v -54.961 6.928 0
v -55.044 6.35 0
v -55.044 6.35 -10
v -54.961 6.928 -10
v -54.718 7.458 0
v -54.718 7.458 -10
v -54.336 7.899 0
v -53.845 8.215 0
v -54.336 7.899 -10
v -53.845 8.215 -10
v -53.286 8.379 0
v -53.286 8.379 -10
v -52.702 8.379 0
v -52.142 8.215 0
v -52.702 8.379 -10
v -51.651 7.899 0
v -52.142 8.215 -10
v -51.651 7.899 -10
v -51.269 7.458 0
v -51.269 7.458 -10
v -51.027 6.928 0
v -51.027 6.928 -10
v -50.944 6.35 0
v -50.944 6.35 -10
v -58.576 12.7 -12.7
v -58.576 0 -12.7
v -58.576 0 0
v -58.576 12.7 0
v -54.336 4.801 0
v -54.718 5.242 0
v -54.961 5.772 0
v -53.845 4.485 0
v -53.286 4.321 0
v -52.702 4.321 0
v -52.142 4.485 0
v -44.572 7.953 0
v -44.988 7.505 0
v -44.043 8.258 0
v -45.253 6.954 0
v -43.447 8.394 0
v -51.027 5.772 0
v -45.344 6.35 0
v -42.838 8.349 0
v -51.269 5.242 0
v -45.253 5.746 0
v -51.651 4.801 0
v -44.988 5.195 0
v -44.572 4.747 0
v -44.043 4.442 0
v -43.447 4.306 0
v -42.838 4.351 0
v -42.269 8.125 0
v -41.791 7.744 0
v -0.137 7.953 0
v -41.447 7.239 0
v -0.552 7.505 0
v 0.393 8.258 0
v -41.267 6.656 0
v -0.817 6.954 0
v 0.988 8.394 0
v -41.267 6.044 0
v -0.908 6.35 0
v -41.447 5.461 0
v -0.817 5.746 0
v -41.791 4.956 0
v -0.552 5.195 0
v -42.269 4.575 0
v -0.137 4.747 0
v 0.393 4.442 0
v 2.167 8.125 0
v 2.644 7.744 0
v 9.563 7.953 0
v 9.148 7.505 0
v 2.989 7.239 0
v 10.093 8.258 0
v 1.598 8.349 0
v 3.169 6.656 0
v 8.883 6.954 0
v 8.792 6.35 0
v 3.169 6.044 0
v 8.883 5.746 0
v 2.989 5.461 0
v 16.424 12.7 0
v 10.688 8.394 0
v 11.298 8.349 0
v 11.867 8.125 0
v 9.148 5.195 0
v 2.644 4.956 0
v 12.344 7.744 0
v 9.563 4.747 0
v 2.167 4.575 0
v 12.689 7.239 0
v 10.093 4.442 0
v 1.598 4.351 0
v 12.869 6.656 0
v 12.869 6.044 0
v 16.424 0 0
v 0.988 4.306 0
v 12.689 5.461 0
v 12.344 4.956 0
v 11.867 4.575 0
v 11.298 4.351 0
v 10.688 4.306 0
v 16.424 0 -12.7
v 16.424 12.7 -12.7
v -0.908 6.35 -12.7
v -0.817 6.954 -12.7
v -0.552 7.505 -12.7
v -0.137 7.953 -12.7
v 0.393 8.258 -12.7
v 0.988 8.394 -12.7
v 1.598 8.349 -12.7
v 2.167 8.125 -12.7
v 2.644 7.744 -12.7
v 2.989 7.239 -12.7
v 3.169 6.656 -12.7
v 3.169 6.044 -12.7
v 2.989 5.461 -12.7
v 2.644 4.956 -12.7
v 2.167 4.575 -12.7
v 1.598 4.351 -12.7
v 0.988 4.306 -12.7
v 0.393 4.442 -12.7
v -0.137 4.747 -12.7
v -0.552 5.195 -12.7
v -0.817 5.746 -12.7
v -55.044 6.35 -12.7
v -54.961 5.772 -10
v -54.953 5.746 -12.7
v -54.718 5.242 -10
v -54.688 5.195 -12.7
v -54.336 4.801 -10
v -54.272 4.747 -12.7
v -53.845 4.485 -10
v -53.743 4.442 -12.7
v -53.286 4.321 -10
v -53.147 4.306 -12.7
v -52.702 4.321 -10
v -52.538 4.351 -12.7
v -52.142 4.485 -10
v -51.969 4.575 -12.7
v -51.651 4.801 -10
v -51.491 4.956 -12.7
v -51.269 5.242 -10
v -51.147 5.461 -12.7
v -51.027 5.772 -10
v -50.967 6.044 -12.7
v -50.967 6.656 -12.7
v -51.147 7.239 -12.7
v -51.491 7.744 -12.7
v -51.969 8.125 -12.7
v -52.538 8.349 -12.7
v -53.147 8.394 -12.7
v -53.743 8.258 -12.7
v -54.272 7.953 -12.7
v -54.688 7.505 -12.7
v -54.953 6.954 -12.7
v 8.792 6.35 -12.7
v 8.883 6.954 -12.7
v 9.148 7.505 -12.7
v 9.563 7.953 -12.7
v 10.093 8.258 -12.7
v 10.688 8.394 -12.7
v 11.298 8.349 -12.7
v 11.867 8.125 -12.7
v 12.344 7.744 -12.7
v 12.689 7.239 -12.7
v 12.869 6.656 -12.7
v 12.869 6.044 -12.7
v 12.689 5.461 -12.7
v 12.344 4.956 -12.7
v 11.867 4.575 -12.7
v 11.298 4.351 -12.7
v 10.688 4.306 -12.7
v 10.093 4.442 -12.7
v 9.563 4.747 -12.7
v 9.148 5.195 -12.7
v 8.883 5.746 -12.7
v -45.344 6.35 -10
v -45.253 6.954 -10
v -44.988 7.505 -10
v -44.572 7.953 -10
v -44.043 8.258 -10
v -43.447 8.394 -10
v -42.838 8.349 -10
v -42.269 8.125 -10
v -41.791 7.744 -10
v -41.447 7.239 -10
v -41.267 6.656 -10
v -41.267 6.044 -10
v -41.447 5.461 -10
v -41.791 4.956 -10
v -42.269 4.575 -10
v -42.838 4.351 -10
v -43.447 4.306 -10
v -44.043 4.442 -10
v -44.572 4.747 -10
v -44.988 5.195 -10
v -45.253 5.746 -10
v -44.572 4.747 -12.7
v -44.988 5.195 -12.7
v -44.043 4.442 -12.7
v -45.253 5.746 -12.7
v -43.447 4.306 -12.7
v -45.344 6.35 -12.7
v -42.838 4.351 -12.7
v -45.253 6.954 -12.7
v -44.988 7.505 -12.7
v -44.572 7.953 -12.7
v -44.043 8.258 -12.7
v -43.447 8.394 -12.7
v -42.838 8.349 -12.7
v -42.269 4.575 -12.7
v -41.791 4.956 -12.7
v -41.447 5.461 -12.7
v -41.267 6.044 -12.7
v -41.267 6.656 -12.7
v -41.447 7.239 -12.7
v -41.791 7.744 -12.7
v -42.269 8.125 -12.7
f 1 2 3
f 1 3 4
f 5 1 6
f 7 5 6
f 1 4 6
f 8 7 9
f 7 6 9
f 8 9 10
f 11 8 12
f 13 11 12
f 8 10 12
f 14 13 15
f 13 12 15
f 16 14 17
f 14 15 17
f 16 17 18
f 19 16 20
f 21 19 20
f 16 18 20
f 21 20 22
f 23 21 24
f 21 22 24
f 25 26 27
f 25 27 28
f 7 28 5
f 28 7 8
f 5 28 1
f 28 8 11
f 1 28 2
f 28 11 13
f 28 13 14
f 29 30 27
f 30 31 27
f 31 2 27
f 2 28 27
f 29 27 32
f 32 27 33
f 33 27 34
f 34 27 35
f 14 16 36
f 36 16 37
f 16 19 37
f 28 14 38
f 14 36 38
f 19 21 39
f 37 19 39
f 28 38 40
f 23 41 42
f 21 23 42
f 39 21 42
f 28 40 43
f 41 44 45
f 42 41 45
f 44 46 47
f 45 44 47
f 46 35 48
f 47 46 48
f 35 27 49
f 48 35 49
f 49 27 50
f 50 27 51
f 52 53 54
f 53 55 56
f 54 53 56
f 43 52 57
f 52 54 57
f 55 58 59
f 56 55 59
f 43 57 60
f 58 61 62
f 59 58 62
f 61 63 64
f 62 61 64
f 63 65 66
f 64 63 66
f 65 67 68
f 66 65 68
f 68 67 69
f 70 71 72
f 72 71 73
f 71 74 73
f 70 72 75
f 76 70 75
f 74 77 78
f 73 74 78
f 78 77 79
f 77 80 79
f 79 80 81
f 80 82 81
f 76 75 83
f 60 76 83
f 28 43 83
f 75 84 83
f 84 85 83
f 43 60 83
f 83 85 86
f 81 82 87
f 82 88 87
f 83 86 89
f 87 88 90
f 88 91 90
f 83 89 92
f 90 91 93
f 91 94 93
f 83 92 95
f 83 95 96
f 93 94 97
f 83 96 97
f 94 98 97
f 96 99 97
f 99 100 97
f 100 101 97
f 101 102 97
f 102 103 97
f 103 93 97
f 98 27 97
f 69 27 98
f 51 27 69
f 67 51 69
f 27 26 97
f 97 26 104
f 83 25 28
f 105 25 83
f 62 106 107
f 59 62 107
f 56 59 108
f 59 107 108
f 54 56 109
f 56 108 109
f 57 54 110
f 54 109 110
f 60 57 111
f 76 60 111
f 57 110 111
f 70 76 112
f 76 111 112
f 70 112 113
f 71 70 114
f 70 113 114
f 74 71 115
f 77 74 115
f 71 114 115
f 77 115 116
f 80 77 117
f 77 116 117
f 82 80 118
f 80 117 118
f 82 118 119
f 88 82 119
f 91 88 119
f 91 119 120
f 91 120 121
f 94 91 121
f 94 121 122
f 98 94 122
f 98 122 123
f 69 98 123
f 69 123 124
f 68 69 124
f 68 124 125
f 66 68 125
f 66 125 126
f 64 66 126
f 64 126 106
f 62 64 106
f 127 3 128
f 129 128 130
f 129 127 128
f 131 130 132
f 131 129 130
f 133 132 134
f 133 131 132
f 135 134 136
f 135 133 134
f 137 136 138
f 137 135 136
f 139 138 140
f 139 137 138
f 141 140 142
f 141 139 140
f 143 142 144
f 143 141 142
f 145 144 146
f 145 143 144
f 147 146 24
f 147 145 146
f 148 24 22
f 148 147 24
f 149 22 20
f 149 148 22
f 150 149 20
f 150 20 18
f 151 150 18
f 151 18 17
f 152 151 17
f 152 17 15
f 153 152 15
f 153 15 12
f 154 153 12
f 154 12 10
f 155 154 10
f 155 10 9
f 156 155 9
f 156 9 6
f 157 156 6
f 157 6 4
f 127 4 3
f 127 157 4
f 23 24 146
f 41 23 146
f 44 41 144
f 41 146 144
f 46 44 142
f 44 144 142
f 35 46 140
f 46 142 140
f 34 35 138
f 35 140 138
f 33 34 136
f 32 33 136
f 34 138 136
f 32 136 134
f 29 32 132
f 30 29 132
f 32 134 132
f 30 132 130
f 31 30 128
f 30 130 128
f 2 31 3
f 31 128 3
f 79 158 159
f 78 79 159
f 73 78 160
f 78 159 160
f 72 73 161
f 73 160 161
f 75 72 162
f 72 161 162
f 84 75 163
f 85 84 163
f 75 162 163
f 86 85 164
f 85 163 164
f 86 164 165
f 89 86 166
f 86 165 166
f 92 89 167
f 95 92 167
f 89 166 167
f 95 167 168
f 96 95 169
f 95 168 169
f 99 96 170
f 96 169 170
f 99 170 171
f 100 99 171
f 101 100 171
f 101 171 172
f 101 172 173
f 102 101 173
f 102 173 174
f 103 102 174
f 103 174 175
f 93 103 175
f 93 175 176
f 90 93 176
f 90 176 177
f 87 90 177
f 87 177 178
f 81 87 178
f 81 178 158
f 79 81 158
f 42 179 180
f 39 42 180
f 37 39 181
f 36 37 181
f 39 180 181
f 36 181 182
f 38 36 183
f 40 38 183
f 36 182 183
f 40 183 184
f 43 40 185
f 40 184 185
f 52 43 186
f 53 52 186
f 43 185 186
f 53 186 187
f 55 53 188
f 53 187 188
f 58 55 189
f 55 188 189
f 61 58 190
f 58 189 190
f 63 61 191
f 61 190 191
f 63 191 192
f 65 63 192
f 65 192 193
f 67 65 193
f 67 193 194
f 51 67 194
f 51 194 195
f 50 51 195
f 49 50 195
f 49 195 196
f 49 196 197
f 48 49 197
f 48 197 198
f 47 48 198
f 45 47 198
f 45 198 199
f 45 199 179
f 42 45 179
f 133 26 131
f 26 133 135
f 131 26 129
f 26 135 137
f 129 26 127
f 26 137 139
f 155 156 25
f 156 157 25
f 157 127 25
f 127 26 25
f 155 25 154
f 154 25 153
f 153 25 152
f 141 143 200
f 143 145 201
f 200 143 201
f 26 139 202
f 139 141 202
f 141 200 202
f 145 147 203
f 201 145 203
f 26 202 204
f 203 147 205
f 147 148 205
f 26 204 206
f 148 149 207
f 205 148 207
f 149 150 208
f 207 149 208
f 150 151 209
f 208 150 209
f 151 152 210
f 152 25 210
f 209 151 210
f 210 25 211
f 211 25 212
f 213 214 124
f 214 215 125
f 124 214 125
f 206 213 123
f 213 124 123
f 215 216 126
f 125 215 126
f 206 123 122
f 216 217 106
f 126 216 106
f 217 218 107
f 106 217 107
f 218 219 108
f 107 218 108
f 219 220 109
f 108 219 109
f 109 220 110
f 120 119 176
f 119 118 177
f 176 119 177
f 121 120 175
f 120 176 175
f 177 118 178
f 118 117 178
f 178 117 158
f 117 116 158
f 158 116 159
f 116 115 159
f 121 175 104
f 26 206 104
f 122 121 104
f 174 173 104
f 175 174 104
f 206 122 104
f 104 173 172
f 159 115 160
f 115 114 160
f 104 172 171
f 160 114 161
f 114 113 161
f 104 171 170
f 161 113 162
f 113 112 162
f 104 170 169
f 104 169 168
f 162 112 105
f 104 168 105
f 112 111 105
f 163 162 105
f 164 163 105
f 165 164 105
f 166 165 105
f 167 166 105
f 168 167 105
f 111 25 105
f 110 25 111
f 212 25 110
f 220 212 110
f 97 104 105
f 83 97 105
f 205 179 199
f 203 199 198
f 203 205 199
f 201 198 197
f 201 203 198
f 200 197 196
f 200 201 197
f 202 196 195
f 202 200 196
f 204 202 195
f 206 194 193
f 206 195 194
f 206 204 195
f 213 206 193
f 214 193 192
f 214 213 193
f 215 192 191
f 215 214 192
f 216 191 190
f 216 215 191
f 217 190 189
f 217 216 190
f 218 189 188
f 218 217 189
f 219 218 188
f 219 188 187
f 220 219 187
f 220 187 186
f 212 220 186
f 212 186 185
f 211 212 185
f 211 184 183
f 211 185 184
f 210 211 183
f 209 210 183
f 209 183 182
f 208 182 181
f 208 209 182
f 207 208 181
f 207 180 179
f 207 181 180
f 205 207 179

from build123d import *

# Parameters (mm, degrees)
BOSS_EXTRUDE1_DEPTH = 12.7
CUT_EXTRUDE1_DEPTH  = 12.7
BOSS_EXTRUDE3_START = -12.7
SKETCH3_W           = 75
SKETCH3_H           = 12.7
SKETCH3_R           = 2.05
BOSS_EXTRUDE3_DEPTH = 12.7
SKETCH4_R           = 2.05
CUT_EXTRUDE2_DEPTH  = 21.7


with BuildPart() as part:
    # Sketch1 → Boss-Extrude1 (new body)
    with BuildSketch(Plane(origin=(0, 0, 0), x_dir=(1, 0, 0), z_dir=(0, 1, 0))):
        Polygon((-58.57612782, 0), (16.42387218, 0), (16.42387218, 5), (-37.711466165, 5), (-37.711466165, 10), (-58.57612782, 10), align=None)
    extrude(amount=BOSS_EXTRUDE1_DEPTH)

    # Sketch2 → Cut-Extrude1 (cut)
    with BuildSketch(Plane(origin=(0, 0, -10), x_dir=(-1, 0, 0), z_dir=(0, 0, -1))):
        with BuildLine():
            ThreePointArc((41.243796992, 6.35), (43.293796992, 4.3), (45.343796992, 6.35))
            Line((45.343796992, 6.35), (41.243796992, 6.35))
        make_face()
        with BuildLine():
            Line((41.243796992, 6.35), (45.343796992, 6.35))
            ThreePointArc((45.343796992, 6.35), (43.293796992, 8.4), (41.243796992, 6.35))
        make_face()
        with BuildLine():
            ThreePointArc((55.043796992, 6.35), (52.993796992, 8.4), (50.943796992, 6.35))
            Line((50.943796992, 6.35), (55.043796992, 6.35))
        make_face()
        with BuildLine():
            Line((55.043796992, 6.35), (50.943796992, 6.35))
            ThreePointArc((50.943796992, 6.35), (52.993796992, 4.3), (55.043796992, 6.35))
        make_face()
    extrude(amount=-CUT_EXTRUDE1_DEPTH, mode=Mode.SUBTRACT)

    # Sketch3 → Boss-Extrude3 (add)
    with BuildSketch(Plane.XY.offset(BOSS_EXTRUDE3_START)):
        with Locations((-21.07612782, 6.35)):
            Rectangle(SKETCH3_W, SKETCH3_H)
        with Locations(Location((-52.993796992, 6.35, 0), (0, 0, 180))):
            Circle(SKETCH3_R, mode=Mode.SUBTRACT)
        with Locations(Location((-43.293796992, 6.35, 0), (0, 0, 180))):
            Circle(SKETCH3_R, mode=Mode.SUBTRACT)
    extrude(amount=BOSS_EXTRUDE3_DEPTH)

    # Sketch4 → Cut-Extrude2 (cut)
    with BuildSketch(Plane(origin=(0, 0, -12.7), x_dir=(-1, 0, 0), z_dir=(0, 0, -1))):
        with Locations((-10.841541353, 6.35)):
            Circle(SKETCH4_R)
        with Locations((-1.141541353, 6.35)):
            Circle(SKETCH4_R)
    extrude(amount=-CUT_EXTRUDE2_DEPTH, mode=Mode.SUBTRACT)


solid = part.part
